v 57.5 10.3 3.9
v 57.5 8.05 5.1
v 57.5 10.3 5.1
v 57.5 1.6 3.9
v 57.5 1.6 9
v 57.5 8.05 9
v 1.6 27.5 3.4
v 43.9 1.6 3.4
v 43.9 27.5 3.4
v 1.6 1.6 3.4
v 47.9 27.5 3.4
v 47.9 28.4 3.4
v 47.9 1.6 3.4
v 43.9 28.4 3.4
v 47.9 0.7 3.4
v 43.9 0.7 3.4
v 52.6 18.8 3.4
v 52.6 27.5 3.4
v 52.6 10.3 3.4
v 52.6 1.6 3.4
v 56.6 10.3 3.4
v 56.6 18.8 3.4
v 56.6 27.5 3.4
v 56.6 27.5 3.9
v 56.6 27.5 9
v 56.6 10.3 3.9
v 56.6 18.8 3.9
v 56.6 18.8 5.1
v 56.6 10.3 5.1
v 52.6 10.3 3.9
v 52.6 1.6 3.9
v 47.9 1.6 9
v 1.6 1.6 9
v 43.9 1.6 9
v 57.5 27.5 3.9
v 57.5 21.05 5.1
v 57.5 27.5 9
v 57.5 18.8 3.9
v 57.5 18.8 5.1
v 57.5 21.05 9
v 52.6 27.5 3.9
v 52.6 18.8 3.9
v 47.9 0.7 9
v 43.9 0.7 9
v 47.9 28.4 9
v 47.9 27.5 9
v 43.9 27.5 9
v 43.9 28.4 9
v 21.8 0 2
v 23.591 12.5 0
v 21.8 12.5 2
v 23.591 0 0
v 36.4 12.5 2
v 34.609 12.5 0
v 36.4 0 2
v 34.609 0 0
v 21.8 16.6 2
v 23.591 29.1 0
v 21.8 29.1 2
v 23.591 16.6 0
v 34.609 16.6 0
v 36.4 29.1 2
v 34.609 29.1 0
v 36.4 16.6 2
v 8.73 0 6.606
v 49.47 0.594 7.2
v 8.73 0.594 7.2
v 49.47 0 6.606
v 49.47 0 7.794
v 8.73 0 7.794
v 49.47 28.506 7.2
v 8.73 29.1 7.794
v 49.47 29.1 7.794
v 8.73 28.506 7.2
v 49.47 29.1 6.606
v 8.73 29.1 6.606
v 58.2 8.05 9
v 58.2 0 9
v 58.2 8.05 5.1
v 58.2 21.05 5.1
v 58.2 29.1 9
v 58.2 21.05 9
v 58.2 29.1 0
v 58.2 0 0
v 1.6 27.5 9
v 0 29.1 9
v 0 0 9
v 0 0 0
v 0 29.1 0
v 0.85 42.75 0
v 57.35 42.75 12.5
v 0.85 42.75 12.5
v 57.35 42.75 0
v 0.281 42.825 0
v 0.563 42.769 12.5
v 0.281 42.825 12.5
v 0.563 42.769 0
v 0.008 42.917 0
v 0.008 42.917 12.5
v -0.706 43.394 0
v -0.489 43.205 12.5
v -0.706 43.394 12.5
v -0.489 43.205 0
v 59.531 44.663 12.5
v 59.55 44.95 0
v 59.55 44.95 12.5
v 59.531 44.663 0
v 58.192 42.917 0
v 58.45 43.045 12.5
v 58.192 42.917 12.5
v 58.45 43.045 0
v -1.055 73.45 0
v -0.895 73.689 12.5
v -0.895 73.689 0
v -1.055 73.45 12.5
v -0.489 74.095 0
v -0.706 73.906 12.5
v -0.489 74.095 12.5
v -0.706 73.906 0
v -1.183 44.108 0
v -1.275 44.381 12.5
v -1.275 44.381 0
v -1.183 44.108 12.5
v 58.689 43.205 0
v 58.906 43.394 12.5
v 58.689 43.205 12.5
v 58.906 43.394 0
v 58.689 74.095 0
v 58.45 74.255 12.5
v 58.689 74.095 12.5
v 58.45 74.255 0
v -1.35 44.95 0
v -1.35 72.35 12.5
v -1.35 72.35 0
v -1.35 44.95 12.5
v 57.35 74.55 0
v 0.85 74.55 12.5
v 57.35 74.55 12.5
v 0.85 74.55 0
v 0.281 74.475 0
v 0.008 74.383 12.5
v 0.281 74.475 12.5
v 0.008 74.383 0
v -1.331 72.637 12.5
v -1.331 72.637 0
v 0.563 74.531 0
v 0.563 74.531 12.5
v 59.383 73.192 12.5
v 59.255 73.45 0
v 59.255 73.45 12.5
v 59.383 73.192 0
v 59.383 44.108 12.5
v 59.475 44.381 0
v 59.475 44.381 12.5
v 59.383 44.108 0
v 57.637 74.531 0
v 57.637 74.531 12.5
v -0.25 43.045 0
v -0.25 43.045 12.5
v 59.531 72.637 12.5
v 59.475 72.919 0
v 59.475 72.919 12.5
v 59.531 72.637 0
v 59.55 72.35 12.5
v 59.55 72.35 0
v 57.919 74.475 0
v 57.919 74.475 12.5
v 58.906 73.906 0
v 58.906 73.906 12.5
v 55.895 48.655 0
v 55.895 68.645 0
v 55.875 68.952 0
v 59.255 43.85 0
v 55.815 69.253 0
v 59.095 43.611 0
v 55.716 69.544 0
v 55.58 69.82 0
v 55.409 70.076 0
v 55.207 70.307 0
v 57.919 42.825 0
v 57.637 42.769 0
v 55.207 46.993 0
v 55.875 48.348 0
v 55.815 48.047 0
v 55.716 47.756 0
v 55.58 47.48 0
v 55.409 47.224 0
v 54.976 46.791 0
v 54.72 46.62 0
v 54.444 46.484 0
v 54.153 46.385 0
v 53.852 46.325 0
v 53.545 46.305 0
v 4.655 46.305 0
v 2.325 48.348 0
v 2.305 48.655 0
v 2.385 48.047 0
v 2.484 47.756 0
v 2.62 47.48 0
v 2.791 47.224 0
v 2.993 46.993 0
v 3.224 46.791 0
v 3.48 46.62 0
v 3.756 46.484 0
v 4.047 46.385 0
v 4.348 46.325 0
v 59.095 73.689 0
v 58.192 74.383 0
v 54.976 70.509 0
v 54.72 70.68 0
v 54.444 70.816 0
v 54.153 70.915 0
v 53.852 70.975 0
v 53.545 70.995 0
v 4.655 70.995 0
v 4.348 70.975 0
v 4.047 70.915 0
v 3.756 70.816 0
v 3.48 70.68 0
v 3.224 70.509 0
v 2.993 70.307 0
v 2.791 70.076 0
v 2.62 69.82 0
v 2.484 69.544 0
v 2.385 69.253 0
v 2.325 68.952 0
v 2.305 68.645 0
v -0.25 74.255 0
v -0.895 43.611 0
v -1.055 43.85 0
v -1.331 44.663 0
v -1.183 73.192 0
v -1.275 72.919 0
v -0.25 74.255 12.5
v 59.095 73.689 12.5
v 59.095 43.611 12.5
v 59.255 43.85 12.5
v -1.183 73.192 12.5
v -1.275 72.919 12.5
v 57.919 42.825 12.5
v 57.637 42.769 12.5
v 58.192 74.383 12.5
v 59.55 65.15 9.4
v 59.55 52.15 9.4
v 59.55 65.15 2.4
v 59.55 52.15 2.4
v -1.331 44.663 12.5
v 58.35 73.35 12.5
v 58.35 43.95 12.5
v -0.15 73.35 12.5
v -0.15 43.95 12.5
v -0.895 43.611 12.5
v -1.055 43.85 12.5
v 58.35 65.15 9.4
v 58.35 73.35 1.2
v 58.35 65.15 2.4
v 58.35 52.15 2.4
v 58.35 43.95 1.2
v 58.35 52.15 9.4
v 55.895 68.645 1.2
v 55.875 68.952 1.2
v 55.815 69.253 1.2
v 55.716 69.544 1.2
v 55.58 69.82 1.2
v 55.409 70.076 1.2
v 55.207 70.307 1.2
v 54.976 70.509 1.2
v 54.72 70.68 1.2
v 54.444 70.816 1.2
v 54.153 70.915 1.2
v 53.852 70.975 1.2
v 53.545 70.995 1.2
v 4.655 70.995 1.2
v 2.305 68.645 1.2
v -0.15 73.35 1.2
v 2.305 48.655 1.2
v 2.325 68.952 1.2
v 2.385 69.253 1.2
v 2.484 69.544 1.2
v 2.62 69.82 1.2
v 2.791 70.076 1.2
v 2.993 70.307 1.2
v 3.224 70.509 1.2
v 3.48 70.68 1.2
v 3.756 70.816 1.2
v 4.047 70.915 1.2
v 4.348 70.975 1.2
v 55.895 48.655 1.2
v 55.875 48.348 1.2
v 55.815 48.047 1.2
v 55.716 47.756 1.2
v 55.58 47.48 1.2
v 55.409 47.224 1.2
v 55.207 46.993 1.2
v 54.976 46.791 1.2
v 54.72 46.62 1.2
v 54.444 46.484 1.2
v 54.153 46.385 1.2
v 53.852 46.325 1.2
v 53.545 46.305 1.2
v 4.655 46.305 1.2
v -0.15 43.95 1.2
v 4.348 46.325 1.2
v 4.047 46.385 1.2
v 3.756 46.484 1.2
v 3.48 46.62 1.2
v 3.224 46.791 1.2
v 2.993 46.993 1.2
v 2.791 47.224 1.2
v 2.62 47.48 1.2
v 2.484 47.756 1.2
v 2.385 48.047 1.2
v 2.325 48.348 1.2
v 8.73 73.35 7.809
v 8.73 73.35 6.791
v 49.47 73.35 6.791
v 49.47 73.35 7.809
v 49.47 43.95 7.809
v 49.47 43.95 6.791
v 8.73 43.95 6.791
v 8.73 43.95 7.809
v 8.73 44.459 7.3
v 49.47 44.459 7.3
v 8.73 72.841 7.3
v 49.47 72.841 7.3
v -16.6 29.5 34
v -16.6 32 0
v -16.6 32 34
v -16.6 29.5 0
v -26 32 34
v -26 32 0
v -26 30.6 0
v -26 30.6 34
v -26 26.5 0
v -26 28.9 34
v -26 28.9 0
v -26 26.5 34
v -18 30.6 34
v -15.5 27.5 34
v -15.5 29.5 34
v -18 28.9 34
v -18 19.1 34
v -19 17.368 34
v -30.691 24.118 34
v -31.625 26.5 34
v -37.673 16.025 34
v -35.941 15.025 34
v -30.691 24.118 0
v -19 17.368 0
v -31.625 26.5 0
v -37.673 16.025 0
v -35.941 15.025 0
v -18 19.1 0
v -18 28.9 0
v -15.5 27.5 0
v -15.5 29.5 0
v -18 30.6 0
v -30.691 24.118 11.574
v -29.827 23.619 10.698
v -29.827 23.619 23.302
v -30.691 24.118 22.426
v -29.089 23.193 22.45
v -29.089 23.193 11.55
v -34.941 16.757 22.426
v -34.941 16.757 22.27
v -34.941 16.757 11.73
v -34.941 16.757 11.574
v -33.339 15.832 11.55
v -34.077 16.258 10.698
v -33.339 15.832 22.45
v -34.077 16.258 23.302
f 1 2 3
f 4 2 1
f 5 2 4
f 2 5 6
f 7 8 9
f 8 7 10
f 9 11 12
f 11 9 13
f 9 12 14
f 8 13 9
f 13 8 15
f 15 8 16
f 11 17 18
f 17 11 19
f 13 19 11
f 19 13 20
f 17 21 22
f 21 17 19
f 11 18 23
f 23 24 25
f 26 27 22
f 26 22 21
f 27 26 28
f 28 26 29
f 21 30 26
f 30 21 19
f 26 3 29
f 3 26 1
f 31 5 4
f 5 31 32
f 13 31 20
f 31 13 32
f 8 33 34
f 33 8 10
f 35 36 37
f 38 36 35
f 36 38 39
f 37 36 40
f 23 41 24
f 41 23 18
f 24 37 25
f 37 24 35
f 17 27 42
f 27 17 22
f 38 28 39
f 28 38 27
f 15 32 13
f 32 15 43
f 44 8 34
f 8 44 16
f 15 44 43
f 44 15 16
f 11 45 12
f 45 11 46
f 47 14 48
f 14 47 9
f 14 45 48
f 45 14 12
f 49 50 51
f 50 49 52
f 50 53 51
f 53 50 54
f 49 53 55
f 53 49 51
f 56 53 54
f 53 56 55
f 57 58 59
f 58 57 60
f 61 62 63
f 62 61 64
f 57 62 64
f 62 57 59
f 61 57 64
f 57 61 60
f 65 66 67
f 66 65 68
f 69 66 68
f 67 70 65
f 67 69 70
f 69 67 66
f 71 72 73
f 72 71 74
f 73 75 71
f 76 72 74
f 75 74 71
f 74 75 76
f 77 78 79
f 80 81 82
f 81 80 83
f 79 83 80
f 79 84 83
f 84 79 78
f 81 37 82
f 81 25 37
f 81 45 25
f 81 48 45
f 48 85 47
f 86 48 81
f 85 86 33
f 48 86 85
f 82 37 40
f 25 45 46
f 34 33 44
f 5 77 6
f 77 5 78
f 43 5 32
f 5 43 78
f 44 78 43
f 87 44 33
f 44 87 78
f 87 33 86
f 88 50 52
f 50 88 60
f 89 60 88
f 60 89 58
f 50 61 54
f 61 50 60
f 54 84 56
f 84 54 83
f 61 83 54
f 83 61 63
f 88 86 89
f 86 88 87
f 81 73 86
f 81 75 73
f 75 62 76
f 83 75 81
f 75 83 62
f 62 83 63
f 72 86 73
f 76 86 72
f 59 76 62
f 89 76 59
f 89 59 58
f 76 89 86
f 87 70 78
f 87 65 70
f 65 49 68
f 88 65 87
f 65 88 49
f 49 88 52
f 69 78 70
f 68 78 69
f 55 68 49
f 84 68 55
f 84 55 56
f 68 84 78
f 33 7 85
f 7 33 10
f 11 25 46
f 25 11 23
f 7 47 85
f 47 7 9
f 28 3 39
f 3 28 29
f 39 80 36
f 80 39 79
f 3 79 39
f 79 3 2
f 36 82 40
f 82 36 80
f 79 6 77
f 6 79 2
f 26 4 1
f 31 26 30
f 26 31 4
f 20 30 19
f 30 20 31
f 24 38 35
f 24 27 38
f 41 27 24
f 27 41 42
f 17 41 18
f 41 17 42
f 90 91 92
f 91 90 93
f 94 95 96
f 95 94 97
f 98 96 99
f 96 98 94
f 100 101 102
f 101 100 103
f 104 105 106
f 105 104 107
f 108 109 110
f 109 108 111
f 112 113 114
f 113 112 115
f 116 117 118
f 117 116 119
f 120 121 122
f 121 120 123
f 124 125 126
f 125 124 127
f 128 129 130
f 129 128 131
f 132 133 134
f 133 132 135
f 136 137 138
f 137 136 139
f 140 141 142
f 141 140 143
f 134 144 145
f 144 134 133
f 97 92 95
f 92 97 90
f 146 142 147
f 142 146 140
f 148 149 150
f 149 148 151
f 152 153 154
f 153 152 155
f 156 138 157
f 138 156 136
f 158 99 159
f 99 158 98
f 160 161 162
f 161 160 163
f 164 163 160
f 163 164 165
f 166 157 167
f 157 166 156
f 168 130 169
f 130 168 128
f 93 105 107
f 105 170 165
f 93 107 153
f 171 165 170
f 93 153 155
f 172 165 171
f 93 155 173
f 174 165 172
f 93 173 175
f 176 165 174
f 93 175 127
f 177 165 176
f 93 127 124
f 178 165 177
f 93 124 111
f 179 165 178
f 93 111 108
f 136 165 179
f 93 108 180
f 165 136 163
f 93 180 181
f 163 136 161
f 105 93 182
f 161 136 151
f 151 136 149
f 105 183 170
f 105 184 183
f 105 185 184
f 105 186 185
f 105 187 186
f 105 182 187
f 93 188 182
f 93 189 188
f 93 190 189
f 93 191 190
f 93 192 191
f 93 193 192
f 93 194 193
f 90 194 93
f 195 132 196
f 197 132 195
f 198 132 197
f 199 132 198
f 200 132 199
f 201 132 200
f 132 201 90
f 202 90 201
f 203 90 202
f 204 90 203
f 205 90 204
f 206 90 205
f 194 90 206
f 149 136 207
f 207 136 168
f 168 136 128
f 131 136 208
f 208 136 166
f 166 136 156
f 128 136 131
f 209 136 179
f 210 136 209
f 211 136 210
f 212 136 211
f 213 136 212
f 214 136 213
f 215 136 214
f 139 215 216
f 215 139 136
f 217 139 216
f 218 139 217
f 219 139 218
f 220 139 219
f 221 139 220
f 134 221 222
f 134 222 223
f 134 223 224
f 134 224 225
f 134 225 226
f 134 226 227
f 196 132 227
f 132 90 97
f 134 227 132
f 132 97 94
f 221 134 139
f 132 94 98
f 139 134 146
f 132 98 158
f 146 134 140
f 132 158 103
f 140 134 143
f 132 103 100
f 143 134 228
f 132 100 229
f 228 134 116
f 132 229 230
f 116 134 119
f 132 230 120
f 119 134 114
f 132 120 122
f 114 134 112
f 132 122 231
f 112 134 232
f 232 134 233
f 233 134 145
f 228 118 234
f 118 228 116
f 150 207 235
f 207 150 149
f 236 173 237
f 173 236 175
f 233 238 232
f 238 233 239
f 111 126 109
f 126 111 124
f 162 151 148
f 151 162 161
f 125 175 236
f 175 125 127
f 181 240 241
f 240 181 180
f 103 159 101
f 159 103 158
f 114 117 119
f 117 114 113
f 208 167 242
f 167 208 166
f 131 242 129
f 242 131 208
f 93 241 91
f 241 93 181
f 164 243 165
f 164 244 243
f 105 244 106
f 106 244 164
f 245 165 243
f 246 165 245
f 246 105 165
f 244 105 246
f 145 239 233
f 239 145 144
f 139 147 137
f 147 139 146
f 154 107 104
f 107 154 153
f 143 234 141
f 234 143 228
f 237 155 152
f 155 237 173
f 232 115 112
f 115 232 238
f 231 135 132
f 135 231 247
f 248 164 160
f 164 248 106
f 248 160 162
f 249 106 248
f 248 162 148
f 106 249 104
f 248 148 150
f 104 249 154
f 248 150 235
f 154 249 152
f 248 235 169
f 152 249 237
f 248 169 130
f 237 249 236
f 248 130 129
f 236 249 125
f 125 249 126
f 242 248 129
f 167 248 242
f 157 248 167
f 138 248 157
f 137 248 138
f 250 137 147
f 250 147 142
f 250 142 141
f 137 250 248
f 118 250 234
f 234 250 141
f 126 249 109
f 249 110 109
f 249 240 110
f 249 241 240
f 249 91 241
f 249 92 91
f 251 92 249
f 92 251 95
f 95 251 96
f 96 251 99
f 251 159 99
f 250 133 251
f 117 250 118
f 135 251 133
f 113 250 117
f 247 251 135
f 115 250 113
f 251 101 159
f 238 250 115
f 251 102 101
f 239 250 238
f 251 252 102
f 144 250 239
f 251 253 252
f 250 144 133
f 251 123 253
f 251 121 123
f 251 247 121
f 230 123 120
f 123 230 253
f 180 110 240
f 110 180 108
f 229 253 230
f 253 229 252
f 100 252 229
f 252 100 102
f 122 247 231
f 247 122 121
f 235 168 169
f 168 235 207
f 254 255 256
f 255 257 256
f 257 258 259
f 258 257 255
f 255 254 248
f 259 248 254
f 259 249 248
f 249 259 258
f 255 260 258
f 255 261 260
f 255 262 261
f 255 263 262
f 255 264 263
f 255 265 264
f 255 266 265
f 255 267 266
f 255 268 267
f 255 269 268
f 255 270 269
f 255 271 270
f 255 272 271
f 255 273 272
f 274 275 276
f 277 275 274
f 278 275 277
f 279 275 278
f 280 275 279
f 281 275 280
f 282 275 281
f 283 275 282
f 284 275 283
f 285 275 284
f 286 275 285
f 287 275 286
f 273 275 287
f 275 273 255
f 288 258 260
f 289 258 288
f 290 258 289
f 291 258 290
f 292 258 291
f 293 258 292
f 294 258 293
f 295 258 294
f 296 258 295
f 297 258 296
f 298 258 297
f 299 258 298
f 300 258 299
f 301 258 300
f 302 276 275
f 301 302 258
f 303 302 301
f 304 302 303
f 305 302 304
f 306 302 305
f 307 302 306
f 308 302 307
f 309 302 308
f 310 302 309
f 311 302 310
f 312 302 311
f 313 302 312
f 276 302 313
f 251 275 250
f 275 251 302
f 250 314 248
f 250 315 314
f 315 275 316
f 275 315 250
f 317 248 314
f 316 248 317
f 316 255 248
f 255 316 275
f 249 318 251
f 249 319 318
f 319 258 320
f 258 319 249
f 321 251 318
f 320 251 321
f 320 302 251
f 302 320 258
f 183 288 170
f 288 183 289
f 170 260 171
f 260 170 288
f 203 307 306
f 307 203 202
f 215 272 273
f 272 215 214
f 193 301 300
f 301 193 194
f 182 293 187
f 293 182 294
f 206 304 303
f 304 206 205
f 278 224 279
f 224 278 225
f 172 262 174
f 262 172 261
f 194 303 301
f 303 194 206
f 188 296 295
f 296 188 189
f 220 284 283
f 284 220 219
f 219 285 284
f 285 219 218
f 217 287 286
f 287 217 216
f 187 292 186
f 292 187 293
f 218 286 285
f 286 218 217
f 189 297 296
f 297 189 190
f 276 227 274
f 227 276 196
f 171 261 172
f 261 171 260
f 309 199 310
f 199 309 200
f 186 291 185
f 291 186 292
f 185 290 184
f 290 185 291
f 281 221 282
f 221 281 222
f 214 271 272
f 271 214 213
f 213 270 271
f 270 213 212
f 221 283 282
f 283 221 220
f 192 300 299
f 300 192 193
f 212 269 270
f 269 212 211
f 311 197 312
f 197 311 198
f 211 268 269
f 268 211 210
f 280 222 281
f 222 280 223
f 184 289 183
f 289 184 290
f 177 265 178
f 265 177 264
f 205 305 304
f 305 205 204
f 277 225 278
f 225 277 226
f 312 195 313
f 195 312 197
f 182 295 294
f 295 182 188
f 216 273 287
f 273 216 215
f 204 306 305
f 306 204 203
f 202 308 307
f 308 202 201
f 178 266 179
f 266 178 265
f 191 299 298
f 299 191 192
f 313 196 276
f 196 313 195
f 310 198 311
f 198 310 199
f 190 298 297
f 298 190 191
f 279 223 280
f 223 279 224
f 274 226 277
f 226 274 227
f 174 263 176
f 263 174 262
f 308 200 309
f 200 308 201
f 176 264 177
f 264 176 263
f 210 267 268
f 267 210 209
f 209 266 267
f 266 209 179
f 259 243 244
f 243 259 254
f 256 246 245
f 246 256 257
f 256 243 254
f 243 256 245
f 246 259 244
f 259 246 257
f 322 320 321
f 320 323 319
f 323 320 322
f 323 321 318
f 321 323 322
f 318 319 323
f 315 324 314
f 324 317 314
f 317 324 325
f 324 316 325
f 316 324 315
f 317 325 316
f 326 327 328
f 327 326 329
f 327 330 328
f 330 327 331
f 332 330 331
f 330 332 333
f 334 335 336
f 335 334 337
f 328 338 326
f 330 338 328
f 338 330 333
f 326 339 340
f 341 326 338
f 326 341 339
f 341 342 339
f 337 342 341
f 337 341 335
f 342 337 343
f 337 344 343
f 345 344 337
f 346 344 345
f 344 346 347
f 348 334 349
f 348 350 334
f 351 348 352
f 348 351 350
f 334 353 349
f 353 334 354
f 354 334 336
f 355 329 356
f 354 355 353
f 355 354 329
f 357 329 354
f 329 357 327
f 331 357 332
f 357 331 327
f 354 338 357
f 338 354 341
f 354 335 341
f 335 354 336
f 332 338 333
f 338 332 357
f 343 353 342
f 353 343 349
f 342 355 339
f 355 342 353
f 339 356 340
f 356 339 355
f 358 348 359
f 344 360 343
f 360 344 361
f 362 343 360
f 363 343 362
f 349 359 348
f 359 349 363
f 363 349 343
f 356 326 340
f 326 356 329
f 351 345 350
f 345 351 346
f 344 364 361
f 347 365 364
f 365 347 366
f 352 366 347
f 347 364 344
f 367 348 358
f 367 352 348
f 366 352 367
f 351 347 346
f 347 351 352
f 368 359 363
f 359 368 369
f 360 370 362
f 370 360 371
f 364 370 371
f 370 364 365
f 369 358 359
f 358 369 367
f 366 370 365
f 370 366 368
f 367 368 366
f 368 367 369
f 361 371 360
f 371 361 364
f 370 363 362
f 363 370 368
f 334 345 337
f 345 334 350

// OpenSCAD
// gnat case for the LilyGO T-Display S3 AMOLED touch
//
// three parts: a shallow tray the board rests in on corner risers, a snap
// on face whose full height skirt forms the case sides, and an angled foot
// that clamps the DE1's horizontal frame lip. dimensions marked MEASURE
// should be verified with calipers.

// ---------------------------------------------------------------- board
// measured with calipers on the actual unit
pcb_l = 54.6;        // board length
pcb_w = 25.5;        // board width
fit = 0.4;           // clearance around the board

// heights measured from the pcb underside. the board rests on the case
// itself: the tall chips sit on the floor and shallow pads under the
// molex jacks make up the difference so the board sits level
board_h = 7.5;       // pcb underside to glass top
under_molex = 3.1;   // molex jacks hang below the pcb (10.6 overall)
under_chips = 3.6;   // tallest chips at the other end (11.1 overall)
molex_pad_w = 4;     // molex pad reach inward from the end wall

// the glass covers nearly the whole face and pokes through the face window
// sitting flush with the case front
glass_l = 53.29;
glass_w = 24.39;
glass_t = 1.09;
glass_r = 2.2;       // corner radius, tuned against test prints
glass_clr = 0.15;    // window clearance around the glass, per side
glass_off_x = 0;     // glass offset from board center, + toward the usb end

// the molex plugs sit on the end edge flanking the usb port and protrude
// a touch, the end wall gets relief either side of the usb cutout
molex_depth = 0.9;   // relief depth into the end wall

// the two side buttons protrude slightly from the long edges
btn_from = 9.5;      // button zone start, from the pcb's usb end edge
btn_w = 2;           // button width
btn_clr = 1;         // relief margin either side of the buttons
btn_depth = 0.9;     // relief depth into the long walls

// usb-c cutout on the right wall, sized for the cable plug housing. the
// port is centered across the board and mid mounted: its bottom sits
// level with the pcb underside (7.5mm below the glass top) and it spans
// 8.5mm (17mm measured from either pcb edge to the port's far side)
usb_w = 8.5;               // port shell width (2 x 17 measured - pcb width)
usb_h = 3.2;               // port shell height
usb_center_h = usb_h / 2;  // port center above the pcb underside
usb_plug_w = 13;           // cable plug housing clearance width
usb_plug_h = 7;            // cable plug housing clearance height

// pcb underside height above the floor, set by the chips resting on it
under_h = under_chips;

// ---------------------------------------------------------------- tray
// a shallow box, the face skirt forms most of the case sides
wall = 1.6;          // tray wall thickness
floor_t = 3.4;       // tray floor thickness, houses the dovetail channel
rim_h = 2.0;         // wall rise above the riser tops, captures the pcb edge
tray_il = pcb_l + fit;
tray_iw = pcb_w + fit;
tray_l = tray_il + 2 * wall;
tray_w = tray_iw + 2 * wall;
tray_h = floor_t + under_h + rim_h;

// ---------------------------------------------------------------- face
face_t = 1.2;        // face plate thickness, the glass sits flush with its top
skirt_t = 1.2;
snap_d = 0.6;        // snap ridge depth
snap_below_rim = 1.8;
face_fit = 0.15;     // skirt to tray clearance
skirt_stop = 2.0;    // skirt ends short of the back so the foot rail and
                     // neck plate pass underneath

// total front to back thickness, back of the floor to the glass top
case_d = floor_t + under_h + board_h;
skirt_h = case_d - face_t - skirt_stop;

// ---------------------------------------------------------------- mount
// two foot variants share the same clamp: the standard 30 degree lean and
// a laid back 45 for easier viewing from above. the steeper lean drops
// the case back further, so that variant needs a taller neck to keep the
// case clear of the clamp and the machine lip
tilt = 30;           // degrees the face leans back from vertical
tilt45 = 45;         // the laid back variant
lip_t = 1.7;         // de1 horizontal lip, measured
clamp_tol = 0;       // the bare lip size tested as a perfect fit
clamp_gap = lip_t + clamp_tol;
clamp_jaw = 8;       // how far the jaws reach back over the lip
clamp_wall = 1.4;    // jaw wall thickness
clamp_w = 34;        // clamp width along the case
neck_h = 8.5;        // rise between clamp and the case bottom edge, tall
                     // enough that the neck stays clear of the lip path
neck_h45 = 12;       // taller neck for the 45 degree foot
neck_t = 5;          // neck thickness

// dovetail joining the foot to the tray back, channel opens at the bottom
// edge so gravity seats the case onto the rail
dove_w = 11;         // channel width at the surface
dove_uc = 1.8;       // undercut each side at depth
dove_d = 2.0;        // channel depth into the floor
dove_len = 12.5;     // how far up the back the channel runs
dove_fit = 0.25;     // rail to channel clearance per side

explode = 0;         // set to ~15 to see the face lifted off
layout = "print"; // "assembly" or "print" for the plated parts

$fn = 48;

// dovetail cross sections shared by the tray channel and the foot rail
module dove_channel_2d() {
  polygon([[-dove_w / 2, 0.01], [dove_w / 2, 0.01],
           [dove_w / 2 + dove_uc, -dove_d], [-dove_w / 2 - dove_uc, -dove_d]]);
}

module dove_rail_2d() {
  polygon([[-dove_w / 2 + dove_fit, 0.2], [dove_w / 2 - dove_fit, 0.2],
           [dove_w / 2 + dove_uc - dove_fit, -dove_d + 0.15],
           [-dove_w / 2 - dove_uc + dove_fit, -dove_d + 0.15]]);
}

// box with rounded vertical corners, footprint l x w with the same corner
// radius as the glass so the face outline echoes the window
module rounded_box(l, w, h, r) {
  hull()
    for (x = [r, l - r])
      for (y = [r, w - r])
        translate([x, y, 0])
          cylinder(r = r, h = h);
}

// the screen window, a rounded rect matching the glass outline so the
// glass pokes through and sits flush, shared by the face and the gauge
module glass_window(h) {
  win_l = glass_l + 2 * glass_clr;
  win_w = glass_w + 2 * glass_clr;
  r = glass_r + glass_clr;
  translate([wall + tray_il / 2 + glass_off_x, wall + tray_iw / 2, 0])
    hull()
      for (x = [-win_l / 2 + r, win_l / 2 - r])
        for (y = [-win_w / 2 + r, win_w / 2 - r])
          translate([x, y, 0])
            cylinder(r = r, h = h);
}

// shallow tray, origin back-bottom-left, face up
module tray() {
  // the molex plugs run right up to the usb port, so the end wall relief
  // reaches from the side walls all the way to the port's own edges
  usb_flank = tray_iw / 2 - usb_w / 2;

  difference() {
    cube([tray_l, tray_w, tray_h]);

    // cavity
    translate([wall, wall, floor_t])
      cube([tray_il, tray_iw, tray_h]);

    // usb notch where the plug bottom dips below the wall top
    translate([tray_l - wall - 1,
               wall + tray_iw / 2 - usb_plug_w / 2,
               floor_t + under_h + usb_center_h - usb_plug_h / 2])
      cube([wall + 2, usb_plug_w, tray_h]);

    // relief for the molex plugs flanking the usb port on the end edge
    for (y = [wall, tray_w - wall - usb_flank])
      translate([tray_l - wall, y, floor_t])
        cube([molex_depth, usb_flank, tray_h]);

    // relief for the side buttons protruding slightly from both long edges
    for (y = [wall - btn_depth, tray_w - wall])
      translate([tray_l - wall - fit / 2 - btn_from - btn_w - btn_clr, y, floor_t])
        cube([btn_w + 2 * btn_clr, btn_depth, tray_h]);

    // dovetail channels recessed in the back, open at both long edges so
    // the case can mount on the foot either way up for a flipped screen
    for (m = [0, 1])
      translate([0, m * tray_w, 0])
        mirror([0, m, 0])
          translate([tray_l / 2, -1, 0])
            rotate([-90, 0, 0])
              linear_extrude(dove_len + 1)
                dove_channel_2d();

    // snap grooves along the outer long walls
    for (y = [0, tray_w])
      translate([tray_l / 2, y, tray_h - snap_below_rim])
        rotate([45, 0, 0])
          cube([tray_l * 0.7, snap_d * 1.4, snap_d * 1.4], center = true);
  }

  // shallow pads under the molex plugs, they carry the usb end while the
  // tall chips rest directly on the floor at the other end, the pads run
  // into the end wall relief so the overhanging plugs sit fully supported
  for (y = [wall, tray_w - wall - usb_flank])
    translate([tray_l - wall - molex_pad_w, y, floor_t])
      cube([molex_pad_w + molex_depth, usb_flank, under_chips - under_molex]);
}

// snap on face, its skirt runs nearly the full case depth and forms the
// sides, the plate underside seats on the display surround
module face() {
  ow = tray_w + 2 * (skirt_t + face_fit);
  ol = tray_l + 2 * (skirt_t + face_fit);

  difference() {
    // plate and skirt as one solid, corners rounded like the window
    translate([-skirt_t - face_fit, -skirt_t - face_fit, 0])
      rounded_box(ol, ow, face_t + skirt_h, glass_r);

    // hollow above the plate where the board and tray nest in
    translate([-face_fit, -face_fit, face_t])
      cube([tray_l + 2 * face_fit, tray_w + 2 * face_fit, skirt_h + 1]);

    // screen window matching the glass outline
    translate([0, 0, -1])
      glass_window(face_t + 2);

    // usb opening through the skirt only, centered on the port, the plate
    // stays unbroken so the face looks complete from the front
    translate([tray_l - 1, wall + tray_iw / 2 - usb_plug_w / 2,
               case_d - (floor_t + under_h + usb_center_h + usb_plug_h / 2)])
      cube([skirt_t + face_fit + 2, usb_plug_w, usb_plug_h]);
  }

  // snap ridges aligned with the tray grooves
  for (y = [-face_fit, tray_w + face_fit])
    translate([tray_l / 2, y, case_d - tray_h + snap_below_rim])
      rotate([45, 0, 0])
        cube([tray_l * 0.7, snap_d * 1.2, snap_d * 1.2], center = true);
}

// c channel that slides forward onto the horizontal frame lip, the slot
// opens toward the machine at the back
module clamp(gap = clamp_gap) {
  h = 2 * clamp_wall + gap;
  difference() {
    translate([-clamp_jaw, -clamp_w / 2, 0])
      cube([clamp_jaw + clamp_wall, clamp_w, h]);
    translate([-clamp_jaw - 1, -clamp_w / 2 - 1, clamp_wall])
      cube([clamp_jaw + 1, clamp_w + 2, gap]);
  }
}

// everything in mounted orientation, clamp at origin, display facing +x
// and leaning back by tilt degrees
clamp_h = 2 * clamp_wall + clamp_gap;

module case_placed(part = "tray") {
  translate([0, 0, clamp_h + neck_h - 0.1])
    rotate([0, -tilt, 0])
      translate([-case_d + 1, 0, 0])
        rotate([90, 0, 90])
          translate([-tray_l / 2, 0, 0])
            if (part == "tray") tray();
            else translate([0, 0, case_d + explode]) mirror([0, 0, 1]) face();
}

// a solid wedge from the clamp top up to the tray's back plane, plus a
// backrest panel running up the case back. the backrest spans the full
// clamp width so when the foot prints on its side it is present from the
// first layer and backs the rail in every layer
module neck(t = tilt, nh = neck_h) {
  hull() {
    translate([-neck_t / 2, -clamp_w / 2, clamp_h - 2])
      cube([neck_t, clamp_w, 2]);
    translate([0, 0, clamp_h + nh - 0.1])
      rotate([0, -t, 0])
        translate([-case_d - 1, -clamp_w / 2, 0])
          cube([case_d + 1, clamp_w, 2]);
  }
  translate([0, 0, clamp_h + nh - 0.1])
    rotate([0, -t, 0])
      translate([-case_d - 1, -clamp_w / 2, 0])
        cube([2, clamp_w, dove_len]);
}

// the dovetail rail in tray model space, sized to slide into the channel.
// its width ends are clipped at 45 degrees so the rail grows out of the
// backrest without overhangs when the foot prints on its side
module rail_tray_space() {
  half = dove_w / 2 + dove_uc;
  translate([tray_l / 2, 1, 0])
    rotate([-90, 0, 0])
      linear_extrude(dove_len - 3)
        intersection() {
          dove_rail_2d();
          polygon([[-half, 1], [-half, 0], [0, -half], [half, 0], [half, 1]]);
        }
}

// a filler that slides into whichever dovetail channel the foot doesn't
// use, sitting flush with the case back. modeled in print orientation:
// wide face on the bed so the flanks taper inward with no overhangs
module dove_plug() {
  difference() {
    rotate([-90, 0, 0])
      linear_extrude(dove_len - 0.3)
        polygon([[-dove_w / 2 - dove_uc + dove_fit, 0],
                 [dove_w / 2 + dove_uc - dove_fit, 0],
                 [dove_w / 2 - dove_fit, -dove_d + 0.15],
                 [-dove_w / 2 + dove_fit, -dove_d + 0.15]]);

    // hollowed slot at the outer end, leaving a foot on each side, so a
    // coin can hook the plug and drag it back out of the channel
    translate([-3, -1, -1])
      cube([6, 3, dove_d + 2]);
  }
}

// the complete foot, clamp, neck and the rail that carries the case. the
// neck hull can sag toward the clamp, so the lip's path is carved back
// out at the end: the slot plane runs clear all the way back and nothing
// sits below the jaw top beyond the jaw tip
module foot(t = tilt, nh = neck_h) {
  difference() {
    union() {
      clamp();
      neck(t, nh);
      translate([0, 0, clamp_h + nh - 0.1])
        rotate([0, -t, 0])
          translate([-case_d + 1, 0, 0])
            rotate([90, 0, 90])
              translate([-tray_l / 2, 0, 0])
                rail_tray_space();
    }

    // the slot plane, extended endlessly toward the machine
    translate([-100, -clamp_w / 2 - 1, clamp_wall])
      cube([100, clamp_w + 2, clamp_gap]);

    // the approach beyond the jaw tip, up past the jaw top
    translate([-100, -clamp_w / 2 - 1, clamp_wall])
      cube([100 - clamp_jaw, clamp_w + 2, clamp_h + 1 - clamp_wall]);
  }
}

// the laid back variant, same clamp with a taller neck
module foot45() {
  foot(tilt45, neck_h45);
}

module assembly() {
  foot();
  case_placed("tray");
  color("steelblue") case_placed("face");
}

// all three parts flat on the bed in their printing orientations
module print_layout() {
  // tray on its back
  tray();

  // face on its front
  translate([0, tray_w + 15, 0])
    face();

  // foot on its side, profile flat on the bed
  translate([-18, 32, clamp_w / 2])
    rotate([90, 0, 0])
      foot();
}

if (layout == "print") {
  print_layout();
} else if (layout == "foot") {
  // just the standard foot in print orientation
  translate([0, 0, clamp_w / 2])
    rotate([90, 0, 0])
      foot();
} else if (layout == "foot45") {
  // the laid back foot in print orientation
  translate([0, 0, clamp_w / 2])
    rotate([90, 0, 0])
      foot45();
} else if (layout == "tray") {
  // just the tray, for reprinting the bottom alone
  tray();
} else if (layout == "face") {
  // just the face in print orientation
  face();
} else if (layout == "plug") {
  // filler for the unused dovetail channel
  dove_plug();
} else {
  assembly();
}
